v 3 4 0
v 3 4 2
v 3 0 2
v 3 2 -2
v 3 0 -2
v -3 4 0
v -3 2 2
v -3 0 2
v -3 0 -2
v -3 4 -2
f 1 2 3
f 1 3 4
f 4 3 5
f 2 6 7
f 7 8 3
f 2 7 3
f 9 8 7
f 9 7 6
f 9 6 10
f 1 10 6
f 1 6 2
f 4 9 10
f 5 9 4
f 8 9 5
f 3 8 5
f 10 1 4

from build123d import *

# Parameters (mm, degrees)
SKETCH_1_W          = 6
SKETCH_1_H          = 4
EXTRUDE_1_DEPTH     = 4
CUT_EXTRUDE_1_DEPTH = 4
SKETCH_10_W         = 32.252295377
SKETCH_10_H         = 15.179180951
CUT_EXTRUDE_2_DEPTH = 5


with BuildPart() as part:
    # 草圖1 → 填料-伸長1 (new body)
    with BuildSketch(Plane(origin=(0, 0, 0), x_dir=(1, 0, 0), z_dir=(0, 1, 0))):
        Rectangle(SKETCH_1_W, SKETCH_1_H)
    extrude(amount=EXTRUDE_1_DEPTH)

    # 草圖6 → 除料-伸長1 (cut)
    with BuildSketch(Plane(origin=(0.789473684, 2.368421053, -2.368421053), x_dir=(0.973328527, -0.162221421, 0.162221421), z_dir=(-0.229415734, -0.688247202, 0.688247202))):
        Polygon((0, 0), (-20.538761547, 0), (-20.538761547, 12.535207186), (11.71353383, 14.625633738), (12.268136792, -0.263322726), align=None)
    extrude(amount=-CUT_EXTRUDE_1_DEPTH, mode=Mode.SUBTRACT)

    # 草圖10 → 除料-伸長2 (cut)
    with BuildSketch(Plane(origin=(-0.789473684, 2.368421053, 2.368421053), x_dir=(0.973328527, 0.162221421, 0.162221421), z_dir=(-0.229415734, 0.688247202, 0.688247202))):
        with Locations((3.943334428, 7.114500239)):
            Rectangle(SKETCH_10_W, SKETCH_10_H)
    extrude(amount=CUT_EXTRUDE_2_DEPTH, mode=Mode.SUBTRACT)


solid = part.part
